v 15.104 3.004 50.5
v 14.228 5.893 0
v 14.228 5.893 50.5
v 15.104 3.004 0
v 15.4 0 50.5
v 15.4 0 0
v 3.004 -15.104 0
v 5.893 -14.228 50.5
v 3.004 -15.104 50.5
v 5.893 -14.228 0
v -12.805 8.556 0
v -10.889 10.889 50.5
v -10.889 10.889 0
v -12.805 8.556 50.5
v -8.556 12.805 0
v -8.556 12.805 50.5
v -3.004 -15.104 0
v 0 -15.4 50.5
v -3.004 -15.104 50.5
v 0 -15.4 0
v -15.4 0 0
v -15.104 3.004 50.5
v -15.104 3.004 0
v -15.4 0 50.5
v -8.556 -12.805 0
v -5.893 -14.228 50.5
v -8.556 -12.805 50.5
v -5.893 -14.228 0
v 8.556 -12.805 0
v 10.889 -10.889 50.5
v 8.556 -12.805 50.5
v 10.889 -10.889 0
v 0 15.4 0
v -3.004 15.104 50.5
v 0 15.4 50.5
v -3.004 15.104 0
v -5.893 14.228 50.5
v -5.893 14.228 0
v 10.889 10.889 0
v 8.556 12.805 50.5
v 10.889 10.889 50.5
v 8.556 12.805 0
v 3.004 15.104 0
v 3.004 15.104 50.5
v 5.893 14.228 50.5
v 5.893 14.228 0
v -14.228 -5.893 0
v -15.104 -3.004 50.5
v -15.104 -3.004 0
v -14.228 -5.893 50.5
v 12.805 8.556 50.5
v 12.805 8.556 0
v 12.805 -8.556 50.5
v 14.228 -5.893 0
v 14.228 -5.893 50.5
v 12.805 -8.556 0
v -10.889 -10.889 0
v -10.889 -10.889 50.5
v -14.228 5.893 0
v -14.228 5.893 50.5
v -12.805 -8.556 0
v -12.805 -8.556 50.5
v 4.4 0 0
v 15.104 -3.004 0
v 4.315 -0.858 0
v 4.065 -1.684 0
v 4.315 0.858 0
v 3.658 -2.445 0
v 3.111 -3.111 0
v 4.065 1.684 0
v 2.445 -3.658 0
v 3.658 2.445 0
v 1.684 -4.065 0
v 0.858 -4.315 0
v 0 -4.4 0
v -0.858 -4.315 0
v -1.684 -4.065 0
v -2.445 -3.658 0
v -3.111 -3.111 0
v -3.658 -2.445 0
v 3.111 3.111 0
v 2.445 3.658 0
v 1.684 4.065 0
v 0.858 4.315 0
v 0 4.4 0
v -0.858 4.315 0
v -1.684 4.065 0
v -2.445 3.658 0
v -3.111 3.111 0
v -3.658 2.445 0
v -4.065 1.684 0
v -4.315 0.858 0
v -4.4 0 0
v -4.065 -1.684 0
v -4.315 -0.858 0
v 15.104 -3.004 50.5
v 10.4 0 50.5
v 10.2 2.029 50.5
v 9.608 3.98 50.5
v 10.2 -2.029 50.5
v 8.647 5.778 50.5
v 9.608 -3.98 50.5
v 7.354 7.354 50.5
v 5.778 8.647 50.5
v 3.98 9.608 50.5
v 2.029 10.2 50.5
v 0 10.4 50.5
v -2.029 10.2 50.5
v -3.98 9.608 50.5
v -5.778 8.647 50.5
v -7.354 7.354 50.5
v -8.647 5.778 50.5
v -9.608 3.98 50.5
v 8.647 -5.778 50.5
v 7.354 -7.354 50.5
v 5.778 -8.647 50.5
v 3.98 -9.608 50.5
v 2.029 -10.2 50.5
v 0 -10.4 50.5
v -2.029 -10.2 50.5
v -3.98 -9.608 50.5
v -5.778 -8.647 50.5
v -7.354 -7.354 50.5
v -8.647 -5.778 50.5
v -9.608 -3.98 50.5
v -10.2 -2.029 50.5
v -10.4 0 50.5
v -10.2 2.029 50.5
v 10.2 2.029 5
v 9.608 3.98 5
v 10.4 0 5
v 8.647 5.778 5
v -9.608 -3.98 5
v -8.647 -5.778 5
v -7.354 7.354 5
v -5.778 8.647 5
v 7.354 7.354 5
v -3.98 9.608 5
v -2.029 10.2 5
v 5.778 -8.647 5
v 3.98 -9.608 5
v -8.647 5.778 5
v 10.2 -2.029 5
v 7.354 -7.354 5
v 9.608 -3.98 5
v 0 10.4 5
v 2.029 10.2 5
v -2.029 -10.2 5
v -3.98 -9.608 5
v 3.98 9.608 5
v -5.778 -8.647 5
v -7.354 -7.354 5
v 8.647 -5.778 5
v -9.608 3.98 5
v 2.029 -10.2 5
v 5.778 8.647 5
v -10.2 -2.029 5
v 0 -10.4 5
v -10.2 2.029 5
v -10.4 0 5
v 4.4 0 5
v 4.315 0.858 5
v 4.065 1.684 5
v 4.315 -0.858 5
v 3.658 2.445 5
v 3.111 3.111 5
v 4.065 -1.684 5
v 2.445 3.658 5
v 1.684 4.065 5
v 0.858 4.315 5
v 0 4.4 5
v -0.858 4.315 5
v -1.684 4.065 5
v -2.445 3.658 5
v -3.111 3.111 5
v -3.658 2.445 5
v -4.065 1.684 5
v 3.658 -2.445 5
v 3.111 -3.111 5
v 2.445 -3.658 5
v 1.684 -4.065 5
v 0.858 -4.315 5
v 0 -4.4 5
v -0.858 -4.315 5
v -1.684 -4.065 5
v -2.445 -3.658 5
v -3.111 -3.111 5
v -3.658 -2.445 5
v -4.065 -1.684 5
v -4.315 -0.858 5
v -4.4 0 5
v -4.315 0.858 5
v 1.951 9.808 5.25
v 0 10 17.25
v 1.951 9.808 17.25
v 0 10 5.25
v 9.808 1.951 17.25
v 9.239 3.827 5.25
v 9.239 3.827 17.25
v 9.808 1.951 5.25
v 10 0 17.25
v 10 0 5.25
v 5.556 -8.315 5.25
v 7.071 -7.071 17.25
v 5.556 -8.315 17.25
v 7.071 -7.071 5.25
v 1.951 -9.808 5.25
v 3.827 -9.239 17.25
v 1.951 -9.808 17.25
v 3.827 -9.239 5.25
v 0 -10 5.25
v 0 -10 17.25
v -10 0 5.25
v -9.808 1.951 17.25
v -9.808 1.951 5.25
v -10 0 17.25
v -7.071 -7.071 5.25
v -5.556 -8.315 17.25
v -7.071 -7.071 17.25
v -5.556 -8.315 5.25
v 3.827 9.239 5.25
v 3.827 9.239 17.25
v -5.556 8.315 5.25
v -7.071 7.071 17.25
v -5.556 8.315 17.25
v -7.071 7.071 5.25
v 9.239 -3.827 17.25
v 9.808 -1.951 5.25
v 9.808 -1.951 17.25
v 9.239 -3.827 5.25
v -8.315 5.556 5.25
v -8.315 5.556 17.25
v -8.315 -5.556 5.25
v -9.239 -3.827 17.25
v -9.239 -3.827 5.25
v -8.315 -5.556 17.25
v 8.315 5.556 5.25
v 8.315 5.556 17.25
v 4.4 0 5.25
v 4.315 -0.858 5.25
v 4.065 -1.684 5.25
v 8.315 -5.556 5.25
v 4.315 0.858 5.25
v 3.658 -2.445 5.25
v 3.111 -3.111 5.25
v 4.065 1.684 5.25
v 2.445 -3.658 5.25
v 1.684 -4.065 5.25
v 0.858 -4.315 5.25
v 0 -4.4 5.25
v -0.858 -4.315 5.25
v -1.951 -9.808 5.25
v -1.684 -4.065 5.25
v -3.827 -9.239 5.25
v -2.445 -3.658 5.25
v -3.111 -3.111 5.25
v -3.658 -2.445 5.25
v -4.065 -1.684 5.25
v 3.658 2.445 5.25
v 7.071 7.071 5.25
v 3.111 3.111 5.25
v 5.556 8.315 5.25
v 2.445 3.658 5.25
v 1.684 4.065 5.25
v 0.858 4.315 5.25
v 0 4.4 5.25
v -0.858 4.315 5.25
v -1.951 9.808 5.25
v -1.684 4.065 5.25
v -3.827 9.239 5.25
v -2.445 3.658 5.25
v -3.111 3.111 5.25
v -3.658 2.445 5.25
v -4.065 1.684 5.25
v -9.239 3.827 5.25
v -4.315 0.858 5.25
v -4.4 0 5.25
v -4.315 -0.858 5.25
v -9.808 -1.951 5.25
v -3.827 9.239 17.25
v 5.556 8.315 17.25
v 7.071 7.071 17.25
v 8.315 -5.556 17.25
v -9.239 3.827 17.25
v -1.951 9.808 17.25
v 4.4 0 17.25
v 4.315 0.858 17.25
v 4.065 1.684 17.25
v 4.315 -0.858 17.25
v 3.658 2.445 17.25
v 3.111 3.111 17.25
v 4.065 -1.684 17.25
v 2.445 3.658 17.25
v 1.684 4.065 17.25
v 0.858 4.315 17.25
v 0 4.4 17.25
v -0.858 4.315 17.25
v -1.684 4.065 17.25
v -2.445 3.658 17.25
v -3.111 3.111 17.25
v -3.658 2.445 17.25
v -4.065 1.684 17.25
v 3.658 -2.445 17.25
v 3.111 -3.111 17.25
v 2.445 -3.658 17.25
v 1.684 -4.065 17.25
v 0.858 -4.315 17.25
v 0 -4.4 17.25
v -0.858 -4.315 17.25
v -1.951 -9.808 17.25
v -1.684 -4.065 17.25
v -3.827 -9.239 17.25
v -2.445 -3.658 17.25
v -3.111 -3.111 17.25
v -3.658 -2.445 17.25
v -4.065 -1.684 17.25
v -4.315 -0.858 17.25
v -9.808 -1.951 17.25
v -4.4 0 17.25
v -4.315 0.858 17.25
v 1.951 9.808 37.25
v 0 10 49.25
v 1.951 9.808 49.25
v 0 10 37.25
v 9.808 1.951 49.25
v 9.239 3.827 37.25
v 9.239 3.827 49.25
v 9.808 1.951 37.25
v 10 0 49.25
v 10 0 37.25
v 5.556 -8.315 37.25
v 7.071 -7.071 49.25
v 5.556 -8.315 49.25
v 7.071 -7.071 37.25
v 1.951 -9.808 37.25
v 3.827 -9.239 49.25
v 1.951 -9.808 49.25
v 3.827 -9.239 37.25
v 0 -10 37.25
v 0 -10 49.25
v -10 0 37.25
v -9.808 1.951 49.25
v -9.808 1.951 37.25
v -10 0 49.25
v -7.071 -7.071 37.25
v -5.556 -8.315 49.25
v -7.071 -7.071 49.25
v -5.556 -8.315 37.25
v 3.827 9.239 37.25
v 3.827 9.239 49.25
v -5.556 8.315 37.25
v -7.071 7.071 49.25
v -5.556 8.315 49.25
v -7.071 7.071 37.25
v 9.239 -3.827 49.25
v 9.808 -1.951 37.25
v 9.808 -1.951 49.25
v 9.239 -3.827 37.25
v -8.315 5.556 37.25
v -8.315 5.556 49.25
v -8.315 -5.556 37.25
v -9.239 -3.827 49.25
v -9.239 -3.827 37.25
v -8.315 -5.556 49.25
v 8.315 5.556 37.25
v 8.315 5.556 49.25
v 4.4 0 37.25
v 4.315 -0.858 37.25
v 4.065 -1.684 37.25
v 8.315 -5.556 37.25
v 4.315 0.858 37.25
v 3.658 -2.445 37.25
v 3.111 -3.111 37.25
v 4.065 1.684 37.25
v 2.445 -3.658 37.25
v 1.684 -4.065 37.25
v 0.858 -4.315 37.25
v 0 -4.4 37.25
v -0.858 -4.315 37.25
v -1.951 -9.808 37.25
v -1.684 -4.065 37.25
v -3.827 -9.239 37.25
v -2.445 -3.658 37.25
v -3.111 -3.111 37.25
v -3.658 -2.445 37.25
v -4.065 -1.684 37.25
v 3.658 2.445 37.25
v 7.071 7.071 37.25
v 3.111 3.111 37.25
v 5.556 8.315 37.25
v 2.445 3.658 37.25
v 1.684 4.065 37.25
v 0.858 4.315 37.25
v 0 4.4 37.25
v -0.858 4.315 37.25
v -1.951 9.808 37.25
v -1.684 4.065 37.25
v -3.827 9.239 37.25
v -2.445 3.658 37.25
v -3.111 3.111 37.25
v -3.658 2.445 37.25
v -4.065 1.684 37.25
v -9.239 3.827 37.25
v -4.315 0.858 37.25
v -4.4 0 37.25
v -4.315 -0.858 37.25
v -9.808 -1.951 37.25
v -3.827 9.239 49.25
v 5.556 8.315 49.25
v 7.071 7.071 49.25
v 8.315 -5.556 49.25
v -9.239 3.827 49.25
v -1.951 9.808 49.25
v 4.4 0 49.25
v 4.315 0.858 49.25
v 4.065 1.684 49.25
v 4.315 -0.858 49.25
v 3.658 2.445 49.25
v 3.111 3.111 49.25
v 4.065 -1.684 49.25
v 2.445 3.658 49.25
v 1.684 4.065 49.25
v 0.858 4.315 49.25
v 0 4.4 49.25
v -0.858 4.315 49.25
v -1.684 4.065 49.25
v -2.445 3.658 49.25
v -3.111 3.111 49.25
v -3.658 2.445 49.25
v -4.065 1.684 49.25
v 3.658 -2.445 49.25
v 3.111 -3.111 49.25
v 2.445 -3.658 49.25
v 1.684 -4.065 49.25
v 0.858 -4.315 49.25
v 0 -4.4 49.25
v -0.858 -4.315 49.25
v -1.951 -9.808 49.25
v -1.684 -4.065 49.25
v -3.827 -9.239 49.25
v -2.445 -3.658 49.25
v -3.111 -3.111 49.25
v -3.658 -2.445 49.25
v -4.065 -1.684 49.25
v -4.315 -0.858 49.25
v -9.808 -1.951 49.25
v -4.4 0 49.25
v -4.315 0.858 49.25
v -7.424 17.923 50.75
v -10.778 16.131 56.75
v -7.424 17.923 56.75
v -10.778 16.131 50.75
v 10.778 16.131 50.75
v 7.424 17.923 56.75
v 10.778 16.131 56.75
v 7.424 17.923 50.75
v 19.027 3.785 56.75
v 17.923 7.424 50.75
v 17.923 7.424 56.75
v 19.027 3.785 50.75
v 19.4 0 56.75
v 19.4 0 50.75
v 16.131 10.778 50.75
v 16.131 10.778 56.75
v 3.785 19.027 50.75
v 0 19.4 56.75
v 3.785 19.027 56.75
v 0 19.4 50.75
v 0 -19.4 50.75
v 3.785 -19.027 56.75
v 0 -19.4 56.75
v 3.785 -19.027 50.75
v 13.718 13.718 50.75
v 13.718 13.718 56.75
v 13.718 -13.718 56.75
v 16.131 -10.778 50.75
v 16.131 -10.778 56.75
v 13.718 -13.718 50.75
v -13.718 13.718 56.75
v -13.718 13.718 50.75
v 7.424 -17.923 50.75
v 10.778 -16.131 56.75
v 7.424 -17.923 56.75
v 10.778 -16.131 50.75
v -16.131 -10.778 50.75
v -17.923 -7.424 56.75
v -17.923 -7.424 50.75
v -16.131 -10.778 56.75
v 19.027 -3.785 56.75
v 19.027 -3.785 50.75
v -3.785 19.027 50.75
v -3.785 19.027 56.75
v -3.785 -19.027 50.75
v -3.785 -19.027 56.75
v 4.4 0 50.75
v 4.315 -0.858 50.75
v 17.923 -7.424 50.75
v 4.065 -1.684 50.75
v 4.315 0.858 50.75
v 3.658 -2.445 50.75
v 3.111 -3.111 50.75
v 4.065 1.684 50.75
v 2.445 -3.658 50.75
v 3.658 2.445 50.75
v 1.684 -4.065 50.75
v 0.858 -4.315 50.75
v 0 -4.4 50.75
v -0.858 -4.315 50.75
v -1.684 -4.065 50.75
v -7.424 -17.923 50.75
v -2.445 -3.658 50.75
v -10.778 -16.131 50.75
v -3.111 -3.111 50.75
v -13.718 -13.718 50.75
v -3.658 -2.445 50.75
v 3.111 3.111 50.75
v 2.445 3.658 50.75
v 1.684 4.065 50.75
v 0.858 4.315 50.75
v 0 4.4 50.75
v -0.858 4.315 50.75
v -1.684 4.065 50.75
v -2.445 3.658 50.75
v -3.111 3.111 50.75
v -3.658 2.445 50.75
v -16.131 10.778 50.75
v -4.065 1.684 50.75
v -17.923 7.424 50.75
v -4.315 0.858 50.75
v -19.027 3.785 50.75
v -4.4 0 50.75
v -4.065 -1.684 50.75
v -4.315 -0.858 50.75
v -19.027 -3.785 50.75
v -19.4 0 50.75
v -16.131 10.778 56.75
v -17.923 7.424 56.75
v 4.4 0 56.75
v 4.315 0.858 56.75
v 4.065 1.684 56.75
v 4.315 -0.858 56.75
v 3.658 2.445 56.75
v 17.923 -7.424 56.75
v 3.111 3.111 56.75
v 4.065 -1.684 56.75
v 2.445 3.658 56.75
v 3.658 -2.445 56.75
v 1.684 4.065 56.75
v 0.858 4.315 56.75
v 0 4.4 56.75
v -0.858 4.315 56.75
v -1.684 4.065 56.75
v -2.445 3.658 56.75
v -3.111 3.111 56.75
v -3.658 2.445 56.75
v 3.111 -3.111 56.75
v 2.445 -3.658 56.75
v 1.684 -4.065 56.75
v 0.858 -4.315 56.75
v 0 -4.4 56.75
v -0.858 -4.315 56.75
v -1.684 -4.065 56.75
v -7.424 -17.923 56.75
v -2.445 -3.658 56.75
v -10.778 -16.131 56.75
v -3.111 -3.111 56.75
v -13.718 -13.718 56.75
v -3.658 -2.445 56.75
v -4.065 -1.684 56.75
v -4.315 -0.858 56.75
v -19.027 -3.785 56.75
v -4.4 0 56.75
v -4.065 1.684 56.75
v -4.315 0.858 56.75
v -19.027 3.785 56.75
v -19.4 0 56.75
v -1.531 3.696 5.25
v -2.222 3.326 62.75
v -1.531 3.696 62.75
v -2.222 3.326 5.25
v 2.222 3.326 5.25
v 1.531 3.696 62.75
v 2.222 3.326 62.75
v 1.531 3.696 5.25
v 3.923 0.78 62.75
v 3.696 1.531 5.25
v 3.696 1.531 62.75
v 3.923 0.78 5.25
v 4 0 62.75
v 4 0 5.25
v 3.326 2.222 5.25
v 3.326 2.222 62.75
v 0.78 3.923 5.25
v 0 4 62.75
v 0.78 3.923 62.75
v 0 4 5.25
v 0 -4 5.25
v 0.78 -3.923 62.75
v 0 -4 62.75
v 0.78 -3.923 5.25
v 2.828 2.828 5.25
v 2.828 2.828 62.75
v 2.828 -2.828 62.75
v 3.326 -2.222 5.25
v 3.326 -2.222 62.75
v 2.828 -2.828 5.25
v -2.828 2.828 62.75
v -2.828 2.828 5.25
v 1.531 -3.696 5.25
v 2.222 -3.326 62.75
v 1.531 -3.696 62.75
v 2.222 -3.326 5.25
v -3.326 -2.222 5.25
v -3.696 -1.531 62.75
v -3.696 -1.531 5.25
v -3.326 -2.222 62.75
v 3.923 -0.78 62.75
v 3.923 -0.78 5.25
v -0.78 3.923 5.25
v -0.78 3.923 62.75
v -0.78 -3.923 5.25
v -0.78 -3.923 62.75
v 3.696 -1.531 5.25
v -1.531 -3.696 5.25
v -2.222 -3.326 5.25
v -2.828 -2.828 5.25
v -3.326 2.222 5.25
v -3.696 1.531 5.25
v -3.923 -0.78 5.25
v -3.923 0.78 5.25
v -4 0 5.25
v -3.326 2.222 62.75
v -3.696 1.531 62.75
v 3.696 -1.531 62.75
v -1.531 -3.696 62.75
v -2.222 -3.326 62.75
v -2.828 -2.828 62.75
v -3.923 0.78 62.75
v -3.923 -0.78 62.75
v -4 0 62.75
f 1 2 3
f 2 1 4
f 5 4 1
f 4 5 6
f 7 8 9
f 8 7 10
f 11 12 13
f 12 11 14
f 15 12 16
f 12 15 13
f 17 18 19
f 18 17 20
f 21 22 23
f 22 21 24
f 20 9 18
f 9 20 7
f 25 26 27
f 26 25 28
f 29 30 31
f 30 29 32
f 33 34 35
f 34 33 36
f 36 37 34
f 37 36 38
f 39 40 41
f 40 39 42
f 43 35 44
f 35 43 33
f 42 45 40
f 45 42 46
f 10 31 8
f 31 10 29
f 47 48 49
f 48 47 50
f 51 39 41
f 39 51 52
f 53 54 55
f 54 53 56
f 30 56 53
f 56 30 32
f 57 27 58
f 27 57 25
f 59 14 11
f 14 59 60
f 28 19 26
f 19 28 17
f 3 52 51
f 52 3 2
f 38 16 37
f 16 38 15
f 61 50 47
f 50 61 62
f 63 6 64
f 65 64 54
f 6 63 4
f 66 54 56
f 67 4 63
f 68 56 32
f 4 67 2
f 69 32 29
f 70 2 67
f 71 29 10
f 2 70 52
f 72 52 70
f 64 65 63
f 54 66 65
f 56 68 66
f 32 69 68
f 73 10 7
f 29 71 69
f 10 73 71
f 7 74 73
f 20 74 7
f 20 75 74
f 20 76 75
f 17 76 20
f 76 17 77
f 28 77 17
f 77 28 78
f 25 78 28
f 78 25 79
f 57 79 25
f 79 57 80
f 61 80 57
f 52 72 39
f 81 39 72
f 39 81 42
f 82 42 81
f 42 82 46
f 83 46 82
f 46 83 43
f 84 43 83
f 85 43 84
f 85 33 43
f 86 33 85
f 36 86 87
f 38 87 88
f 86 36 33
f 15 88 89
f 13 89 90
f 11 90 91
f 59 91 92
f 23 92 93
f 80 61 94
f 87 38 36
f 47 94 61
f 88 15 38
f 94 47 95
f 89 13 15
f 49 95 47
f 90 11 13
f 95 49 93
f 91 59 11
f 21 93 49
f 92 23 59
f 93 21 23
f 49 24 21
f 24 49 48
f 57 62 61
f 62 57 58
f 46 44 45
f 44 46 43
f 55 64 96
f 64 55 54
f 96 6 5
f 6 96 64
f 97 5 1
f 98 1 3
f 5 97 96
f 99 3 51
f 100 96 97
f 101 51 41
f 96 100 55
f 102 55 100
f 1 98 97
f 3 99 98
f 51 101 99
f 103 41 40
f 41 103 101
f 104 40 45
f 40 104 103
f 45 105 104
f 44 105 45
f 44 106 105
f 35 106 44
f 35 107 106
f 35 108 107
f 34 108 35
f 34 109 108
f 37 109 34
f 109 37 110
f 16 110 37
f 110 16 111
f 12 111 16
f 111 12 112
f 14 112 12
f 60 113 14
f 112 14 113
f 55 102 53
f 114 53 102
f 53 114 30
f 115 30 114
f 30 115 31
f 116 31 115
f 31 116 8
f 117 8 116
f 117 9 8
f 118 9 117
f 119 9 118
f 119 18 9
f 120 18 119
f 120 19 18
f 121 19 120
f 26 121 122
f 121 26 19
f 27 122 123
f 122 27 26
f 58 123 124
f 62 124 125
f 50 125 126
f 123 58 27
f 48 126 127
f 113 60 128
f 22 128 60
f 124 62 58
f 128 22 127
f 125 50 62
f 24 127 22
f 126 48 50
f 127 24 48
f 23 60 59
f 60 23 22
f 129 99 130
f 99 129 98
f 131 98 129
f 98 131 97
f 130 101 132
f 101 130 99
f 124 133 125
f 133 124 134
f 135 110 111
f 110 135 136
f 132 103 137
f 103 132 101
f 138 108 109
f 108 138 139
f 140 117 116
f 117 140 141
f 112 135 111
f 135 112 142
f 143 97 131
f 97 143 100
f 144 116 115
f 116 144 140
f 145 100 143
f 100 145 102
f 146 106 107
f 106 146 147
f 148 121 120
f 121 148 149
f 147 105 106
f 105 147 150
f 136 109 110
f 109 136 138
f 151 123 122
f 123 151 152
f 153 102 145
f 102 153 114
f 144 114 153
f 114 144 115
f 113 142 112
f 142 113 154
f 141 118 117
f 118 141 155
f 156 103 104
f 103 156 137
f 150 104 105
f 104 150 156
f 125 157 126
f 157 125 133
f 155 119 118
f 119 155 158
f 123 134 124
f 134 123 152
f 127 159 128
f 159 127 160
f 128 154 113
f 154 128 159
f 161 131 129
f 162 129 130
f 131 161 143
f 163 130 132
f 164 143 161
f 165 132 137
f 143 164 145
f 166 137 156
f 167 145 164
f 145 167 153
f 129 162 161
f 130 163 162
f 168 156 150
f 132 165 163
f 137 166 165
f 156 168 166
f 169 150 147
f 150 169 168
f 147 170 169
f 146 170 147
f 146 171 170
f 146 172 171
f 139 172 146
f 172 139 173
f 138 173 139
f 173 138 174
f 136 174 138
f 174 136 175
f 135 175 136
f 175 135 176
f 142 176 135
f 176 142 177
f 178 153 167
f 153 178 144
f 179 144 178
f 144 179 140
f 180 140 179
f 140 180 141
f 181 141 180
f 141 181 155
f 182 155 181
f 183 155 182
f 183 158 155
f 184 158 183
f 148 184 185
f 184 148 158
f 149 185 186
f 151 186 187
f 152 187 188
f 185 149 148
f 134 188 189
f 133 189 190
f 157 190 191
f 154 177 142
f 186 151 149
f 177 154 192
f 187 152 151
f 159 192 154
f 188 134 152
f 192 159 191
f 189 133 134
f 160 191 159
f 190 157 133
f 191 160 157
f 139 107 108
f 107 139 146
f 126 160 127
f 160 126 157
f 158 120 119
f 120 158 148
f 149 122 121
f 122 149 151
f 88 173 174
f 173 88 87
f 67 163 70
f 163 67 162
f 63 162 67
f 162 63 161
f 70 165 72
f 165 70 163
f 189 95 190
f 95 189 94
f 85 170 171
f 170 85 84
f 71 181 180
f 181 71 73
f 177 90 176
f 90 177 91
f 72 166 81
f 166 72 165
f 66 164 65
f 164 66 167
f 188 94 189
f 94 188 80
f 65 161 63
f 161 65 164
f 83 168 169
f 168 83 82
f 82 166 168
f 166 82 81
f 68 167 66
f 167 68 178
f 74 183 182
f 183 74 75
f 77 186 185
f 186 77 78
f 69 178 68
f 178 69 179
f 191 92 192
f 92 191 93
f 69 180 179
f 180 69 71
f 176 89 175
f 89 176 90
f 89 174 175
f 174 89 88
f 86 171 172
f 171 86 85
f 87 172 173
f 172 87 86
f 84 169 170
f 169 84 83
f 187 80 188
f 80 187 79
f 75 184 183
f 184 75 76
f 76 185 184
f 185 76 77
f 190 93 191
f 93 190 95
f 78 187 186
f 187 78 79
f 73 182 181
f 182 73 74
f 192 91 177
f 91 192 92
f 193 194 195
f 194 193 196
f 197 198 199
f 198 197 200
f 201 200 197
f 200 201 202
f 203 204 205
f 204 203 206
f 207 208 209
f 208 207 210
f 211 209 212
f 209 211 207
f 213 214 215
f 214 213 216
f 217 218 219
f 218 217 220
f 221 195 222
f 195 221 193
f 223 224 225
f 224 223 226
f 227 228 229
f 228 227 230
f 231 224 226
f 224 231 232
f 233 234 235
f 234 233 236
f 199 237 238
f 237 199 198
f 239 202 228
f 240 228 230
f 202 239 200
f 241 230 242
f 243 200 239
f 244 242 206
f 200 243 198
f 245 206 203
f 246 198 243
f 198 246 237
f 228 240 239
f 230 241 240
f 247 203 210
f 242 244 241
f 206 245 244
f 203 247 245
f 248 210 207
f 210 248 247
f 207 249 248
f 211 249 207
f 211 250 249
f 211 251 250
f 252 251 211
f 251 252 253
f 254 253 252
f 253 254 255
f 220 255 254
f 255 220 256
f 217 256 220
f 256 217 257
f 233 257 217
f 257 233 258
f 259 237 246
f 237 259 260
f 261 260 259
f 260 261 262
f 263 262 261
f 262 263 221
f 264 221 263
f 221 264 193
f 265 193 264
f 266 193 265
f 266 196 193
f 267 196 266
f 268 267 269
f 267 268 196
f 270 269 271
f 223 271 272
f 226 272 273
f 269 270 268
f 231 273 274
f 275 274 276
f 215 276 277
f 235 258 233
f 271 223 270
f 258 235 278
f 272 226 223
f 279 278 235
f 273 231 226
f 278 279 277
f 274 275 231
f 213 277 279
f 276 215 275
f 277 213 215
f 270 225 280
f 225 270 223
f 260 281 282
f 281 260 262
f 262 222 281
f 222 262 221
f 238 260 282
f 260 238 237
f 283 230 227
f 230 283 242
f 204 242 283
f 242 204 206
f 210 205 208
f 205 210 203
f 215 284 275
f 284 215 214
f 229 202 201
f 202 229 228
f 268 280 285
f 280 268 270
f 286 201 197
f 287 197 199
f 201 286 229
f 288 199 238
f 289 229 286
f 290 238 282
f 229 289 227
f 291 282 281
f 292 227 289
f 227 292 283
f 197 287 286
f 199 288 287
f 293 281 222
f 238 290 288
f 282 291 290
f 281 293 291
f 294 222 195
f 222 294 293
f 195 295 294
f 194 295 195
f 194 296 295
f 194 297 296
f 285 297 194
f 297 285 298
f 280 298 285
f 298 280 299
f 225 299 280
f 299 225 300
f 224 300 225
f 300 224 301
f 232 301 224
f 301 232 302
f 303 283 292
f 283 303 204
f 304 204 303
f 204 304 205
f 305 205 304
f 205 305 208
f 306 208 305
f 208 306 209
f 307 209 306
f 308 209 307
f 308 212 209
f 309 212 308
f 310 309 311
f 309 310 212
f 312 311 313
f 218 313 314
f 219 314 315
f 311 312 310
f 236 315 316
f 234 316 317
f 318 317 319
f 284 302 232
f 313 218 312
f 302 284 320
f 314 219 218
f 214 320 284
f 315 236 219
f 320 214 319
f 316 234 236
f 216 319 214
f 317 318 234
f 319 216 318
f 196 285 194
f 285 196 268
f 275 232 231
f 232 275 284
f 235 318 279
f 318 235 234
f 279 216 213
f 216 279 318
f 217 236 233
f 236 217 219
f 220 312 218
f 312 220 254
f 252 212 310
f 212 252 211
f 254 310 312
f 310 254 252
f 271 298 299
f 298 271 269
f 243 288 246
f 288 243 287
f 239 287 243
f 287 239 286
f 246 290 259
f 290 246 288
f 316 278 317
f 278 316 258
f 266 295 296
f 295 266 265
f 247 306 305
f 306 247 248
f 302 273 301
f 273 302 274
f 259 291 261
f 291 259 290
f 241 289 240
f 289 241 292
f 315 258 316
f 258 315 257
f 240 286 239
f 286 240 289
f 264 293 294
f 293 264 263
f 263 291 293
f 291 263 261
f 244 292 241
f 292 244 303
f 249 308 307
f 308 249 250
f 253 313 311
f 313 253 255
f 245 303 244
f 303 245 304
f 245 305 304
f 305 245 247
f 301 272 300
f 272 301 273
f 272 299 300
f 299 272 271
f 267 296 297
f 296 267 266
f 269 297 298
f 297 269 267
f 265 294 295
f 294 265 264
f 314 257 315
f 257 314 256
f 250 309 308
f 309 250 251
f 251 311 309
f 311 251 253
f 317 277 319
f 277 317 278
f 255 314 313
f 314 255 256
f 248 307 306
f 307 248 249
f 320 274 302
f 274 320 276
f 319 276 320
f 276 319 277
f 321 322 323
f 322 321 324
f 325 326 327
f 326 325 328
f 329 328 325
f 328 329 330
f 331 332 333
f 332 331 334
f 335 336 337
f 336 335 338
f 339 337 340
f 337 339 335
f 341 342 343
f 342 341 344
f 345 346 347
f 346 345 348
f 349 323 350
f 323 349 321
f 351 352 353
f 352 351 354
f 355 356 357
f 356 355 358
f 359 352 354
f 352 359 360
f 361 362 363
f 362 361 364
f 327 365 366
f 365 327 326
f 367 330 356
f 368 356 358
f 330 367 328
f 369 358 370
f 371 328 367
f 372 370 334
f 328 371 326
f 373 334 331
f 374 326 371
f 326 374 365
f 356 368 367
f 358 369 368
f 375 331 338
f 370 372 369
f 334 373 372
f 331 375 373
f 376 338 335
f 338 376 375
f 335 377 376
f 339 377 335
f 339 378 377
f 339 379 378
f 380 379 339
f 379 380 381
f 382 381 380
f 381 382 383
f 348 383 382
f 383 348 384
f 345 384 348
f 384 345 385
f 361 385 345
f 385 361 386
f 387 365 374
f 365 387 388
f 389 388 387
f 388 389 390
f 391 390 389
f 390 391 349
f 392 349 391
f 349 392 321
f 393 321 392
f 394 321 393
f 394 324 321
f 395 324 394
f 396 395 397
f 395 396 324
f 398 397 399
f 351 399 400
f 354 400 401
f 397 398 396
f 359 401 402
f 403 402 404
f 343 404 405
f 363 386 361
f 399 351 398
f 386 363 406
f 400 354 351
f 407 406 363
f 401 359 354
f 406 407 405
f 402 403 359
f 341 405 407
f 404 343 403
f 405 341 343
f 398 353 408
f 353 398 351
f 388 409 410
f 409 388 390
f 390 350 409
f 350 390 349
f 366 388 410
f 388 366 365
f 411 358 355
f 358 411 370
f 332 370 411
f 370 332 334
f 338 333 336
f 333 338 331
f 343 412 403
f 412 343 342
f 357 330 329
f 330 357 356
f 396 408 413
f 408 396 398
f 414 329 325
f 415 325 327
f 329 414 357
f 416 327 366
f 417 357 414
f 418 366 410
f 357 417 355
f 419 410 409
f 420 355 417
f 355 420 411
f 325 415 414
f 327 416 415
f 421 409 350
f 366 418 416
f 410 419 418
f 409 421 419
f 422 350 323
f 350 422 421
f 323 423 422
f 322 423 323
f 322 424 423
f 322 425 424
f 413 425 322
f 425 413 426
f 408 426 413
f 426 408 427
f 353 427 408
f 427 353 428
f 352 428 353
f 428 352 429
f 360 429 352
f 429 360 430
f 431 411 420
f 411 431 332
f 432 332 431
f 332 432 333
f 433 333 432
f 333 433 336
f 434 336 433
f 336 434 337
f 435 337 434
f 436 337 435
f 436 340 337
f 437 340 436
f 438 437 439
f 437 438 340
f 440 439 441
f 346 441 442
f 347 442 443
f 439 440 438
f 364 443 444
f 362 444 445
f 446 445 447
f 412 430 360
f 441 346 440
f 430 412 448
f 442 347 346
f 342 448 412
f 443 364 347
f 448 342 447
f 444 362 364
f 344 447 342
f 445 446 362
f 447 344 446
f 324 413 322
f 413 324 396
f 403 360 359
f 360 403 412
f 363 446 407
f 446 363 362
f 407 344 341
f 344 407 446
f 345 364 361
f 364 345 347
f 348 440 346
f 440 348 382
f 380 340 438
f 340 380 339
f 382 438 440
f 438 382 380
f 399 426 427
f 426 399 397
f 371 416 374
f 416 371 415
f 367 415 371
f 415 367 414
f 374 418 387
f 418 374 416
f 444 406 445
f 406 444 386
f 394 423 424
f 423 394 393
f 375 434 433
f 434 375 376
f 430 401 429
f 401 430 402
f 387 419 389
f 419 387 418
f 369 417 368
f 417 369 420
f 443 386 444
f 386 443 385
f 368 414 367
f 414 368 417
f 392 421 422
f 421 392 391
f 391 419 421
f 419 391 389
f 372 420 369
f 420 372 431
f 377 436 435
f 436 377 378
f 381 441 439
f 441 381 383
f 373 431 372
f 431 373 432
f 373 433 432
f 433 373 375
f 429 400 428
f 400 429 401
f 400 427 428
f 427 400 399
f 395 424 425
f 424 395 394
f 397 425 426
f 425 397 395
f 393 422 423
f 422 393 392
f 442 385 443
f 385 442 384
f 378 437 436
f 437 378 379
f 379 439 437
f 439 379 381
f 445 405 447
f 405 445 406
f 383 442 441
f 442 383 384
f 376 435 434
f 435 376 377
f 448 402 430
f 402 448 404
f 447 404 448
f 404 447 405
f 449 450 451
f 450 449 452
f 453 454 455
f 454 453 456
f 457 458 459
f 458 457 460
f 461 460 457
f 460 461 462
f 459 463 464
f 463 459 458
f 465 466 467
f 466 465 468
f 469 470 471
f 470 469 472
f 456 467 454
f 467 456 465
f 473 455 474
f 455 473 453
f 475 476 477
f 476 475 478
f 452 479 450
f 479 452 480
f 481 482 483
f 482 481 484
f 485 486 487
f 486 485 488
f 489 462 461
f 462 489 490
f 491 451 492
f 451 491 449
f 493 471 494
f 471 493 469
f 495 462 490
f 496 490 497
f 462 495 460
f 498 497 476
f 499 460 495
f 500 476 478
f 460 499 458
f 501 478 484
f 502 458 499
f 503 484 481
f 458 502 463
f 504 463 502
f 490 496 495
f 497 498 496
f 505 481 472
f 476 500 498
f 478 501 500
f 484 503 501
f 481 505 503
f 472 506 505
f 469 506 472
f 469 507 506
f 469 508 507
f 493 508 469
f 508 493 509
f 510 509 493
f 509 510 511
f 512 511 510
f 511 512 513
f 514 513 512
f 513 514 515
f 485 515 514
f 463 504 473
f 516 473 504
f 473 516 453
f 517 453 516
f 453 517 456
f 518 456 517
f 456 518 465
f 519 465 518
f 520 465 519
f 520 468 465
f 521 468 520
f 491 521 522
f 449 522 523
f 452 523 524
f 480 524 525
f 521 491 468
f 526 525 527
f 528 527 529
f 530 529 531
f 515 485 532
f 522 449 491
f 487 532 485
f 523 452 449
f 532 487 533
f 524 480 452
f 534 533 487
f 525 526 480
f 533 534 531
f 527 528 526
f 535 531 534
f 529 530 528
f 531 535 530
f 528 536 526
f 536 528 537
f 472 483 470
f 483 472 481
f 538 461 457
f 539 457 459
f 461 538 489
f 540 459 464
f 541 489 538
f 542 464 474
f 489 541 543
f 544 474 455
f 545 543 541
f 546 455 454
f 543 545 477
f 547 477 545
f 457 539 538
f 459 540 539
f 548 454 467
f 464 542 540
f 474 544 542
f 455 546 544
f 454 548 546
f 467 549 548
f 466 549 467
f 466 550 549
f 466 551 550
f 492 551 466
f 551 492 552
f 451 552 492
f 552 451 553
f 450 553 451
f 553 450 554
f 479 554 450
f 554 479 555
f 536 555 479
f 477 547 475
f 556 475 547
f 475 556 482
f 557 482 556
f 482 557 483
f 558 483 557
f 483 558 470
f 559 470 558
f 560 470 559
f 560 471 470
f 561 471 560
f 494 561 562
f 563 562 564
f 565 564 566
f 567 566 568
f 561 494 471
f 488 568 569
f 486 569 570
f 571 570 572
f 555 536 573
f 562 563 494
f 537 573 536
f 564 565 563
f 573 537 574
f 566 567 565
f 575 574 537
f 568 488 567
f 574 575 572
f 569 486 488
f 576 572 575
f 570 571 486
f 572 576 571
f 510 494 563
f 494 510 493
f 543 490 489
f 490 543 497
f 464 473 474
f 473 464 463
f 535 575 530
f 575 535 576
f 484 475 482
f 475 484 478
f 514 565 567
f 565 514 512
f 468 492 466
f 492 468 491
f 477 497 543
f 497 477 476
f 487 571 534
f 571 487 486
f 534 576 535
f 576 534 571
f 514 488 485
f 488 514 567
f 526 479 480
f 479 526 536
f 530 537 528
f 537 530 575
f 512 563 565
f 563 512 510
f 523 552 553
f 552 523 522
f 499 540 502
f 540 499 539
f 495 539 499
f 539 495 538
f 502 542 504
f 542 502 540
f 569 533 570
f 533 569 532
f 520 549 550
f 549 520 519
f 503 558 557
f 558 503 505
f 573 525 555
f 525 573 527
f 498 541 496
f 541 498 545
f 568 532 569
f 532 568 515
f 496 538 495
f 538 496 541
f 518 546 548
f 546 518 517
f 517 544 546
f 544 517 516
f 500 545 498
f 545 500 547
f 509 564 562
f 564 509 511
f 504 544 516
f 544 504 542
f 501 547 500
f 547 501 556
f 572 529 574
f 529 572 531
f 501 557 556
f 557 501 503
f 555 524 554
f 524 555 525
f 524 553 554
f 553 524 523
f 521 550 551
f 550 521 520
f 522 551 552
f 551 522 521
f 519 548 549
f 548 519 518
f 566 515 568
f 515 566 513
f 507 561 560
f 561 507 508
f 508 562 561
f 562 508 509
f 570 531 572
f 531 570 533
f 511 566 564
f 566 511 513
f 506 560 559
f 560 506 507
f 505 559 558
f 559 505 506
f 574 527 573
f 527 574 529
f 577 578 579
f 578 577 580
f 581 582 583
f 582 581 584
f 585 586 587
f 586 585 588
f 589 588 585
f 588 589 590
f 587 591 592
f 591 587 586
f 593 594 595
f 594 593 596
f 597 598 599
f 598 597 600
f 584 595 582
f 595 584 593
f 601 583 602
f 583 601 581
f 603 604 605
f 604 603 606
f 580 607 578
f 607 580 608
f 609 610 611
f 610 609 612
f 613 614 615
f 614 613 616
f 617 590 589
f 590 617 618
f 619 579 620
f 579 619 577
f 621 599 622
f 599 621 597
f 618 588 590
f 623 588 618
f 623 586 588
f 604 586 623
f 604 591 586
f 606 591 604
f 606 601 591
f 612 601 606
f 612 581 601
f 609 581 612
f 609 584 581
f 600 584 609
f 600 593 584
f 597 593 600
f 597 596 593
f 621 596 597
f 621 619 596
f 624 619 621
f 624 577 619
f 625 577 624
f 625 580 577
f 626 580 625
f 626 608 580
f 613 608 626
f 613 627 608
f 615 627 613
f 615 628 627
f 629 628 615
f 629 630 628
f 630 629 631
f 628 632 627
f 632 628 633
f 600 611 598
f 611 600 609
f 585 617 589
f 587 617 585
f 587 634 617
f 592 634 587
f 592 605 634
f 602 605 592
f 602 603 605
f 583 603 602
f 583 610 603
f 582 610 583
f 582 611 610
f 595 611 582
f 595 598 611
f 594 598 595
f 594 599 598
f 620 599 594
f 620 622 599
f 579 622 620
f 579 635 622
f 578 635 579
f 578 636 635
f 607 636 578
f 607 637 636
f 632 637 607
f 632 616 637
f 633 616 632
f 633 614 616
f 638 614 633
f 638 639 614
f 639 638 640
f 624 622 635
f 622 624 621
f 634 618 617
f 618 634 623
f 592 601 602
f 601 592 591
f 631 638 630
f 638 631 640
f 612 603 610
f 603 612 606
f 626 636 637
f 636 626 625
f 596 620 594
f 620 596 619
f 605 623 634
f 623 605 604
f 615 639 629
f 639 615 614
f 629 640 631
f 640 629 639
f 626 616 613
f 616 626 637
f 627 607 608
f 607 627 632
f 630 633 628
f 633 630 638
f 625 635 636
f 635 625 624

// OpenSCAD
$fn = 32;

// ------------------------------------------------------------------------
// Shaft station: cup d30.8 x 50.5 mm, shaft d8
// Every part is its own module, assembly() places every instance.
// ------------------------------------------------------------------------

// --- part 1 ---
module housing_cup() {
  difference() {
    cylinder(h = 50.5, d = 30.8);
    translate([0, 0, 5]) cylinder(h = 46.5, d = 20.8);
    translate([0, 0, -1]) cylinder(h = 7, d = 8.8);
  }
}

// --- part 2 ---
module bearing_lower() {
  difference() {
      translate([0, 0, 0]) cylinder(h = 12, d = 20);
      translate([0, 0, -1]) cylinder(h = 14, d = 8.8);
    }
}

// --- part 3 ---
module bearing_upper() {
  difference() {
      translate([0, 0, 0]) cylinder(h = 12, d = 20);
      translate([0, 0, -1]) cylinder(h = 14, d = 8.8);
    }
}

// --- part 4 ---
module station_shaft() {
  translate([0, 0, -28.75]) cylinder(h = 57.5, d = 8);
}

// --- part 5 ---
module station_cover() {
  difference() {
    cylinder(h = 6, d = 38.8);
    translate([0, 0, -1]) cylinder(h = 8, d = 8.8);
  }
}

// --- assembly ---
module assembly() {
  color([0.80, 0.24, 0.20]) translate([0, 0, 0]) rotate([0, 0, 0]) housing_cup();
  color([0.20, 0.45, 0.75]) translate([0, 0, 5.25]) rotate([0, 0, 0]) bearing_lower();
  color([0.25, 0.62, 0.32]) translate([0, 0, 37.25]) rotate([0, 0, 0]) bearing_upper();
  color([0.92, 0.70, 0.18]) translate([0, 0, 34]) rotate([0, 0, 0]) station_shaft();
  color([0.58, 0.35, 0.70]) translate([0, 0, 50.75]) rotate([0, 0, 0]) station_cover();
}

assembly();
